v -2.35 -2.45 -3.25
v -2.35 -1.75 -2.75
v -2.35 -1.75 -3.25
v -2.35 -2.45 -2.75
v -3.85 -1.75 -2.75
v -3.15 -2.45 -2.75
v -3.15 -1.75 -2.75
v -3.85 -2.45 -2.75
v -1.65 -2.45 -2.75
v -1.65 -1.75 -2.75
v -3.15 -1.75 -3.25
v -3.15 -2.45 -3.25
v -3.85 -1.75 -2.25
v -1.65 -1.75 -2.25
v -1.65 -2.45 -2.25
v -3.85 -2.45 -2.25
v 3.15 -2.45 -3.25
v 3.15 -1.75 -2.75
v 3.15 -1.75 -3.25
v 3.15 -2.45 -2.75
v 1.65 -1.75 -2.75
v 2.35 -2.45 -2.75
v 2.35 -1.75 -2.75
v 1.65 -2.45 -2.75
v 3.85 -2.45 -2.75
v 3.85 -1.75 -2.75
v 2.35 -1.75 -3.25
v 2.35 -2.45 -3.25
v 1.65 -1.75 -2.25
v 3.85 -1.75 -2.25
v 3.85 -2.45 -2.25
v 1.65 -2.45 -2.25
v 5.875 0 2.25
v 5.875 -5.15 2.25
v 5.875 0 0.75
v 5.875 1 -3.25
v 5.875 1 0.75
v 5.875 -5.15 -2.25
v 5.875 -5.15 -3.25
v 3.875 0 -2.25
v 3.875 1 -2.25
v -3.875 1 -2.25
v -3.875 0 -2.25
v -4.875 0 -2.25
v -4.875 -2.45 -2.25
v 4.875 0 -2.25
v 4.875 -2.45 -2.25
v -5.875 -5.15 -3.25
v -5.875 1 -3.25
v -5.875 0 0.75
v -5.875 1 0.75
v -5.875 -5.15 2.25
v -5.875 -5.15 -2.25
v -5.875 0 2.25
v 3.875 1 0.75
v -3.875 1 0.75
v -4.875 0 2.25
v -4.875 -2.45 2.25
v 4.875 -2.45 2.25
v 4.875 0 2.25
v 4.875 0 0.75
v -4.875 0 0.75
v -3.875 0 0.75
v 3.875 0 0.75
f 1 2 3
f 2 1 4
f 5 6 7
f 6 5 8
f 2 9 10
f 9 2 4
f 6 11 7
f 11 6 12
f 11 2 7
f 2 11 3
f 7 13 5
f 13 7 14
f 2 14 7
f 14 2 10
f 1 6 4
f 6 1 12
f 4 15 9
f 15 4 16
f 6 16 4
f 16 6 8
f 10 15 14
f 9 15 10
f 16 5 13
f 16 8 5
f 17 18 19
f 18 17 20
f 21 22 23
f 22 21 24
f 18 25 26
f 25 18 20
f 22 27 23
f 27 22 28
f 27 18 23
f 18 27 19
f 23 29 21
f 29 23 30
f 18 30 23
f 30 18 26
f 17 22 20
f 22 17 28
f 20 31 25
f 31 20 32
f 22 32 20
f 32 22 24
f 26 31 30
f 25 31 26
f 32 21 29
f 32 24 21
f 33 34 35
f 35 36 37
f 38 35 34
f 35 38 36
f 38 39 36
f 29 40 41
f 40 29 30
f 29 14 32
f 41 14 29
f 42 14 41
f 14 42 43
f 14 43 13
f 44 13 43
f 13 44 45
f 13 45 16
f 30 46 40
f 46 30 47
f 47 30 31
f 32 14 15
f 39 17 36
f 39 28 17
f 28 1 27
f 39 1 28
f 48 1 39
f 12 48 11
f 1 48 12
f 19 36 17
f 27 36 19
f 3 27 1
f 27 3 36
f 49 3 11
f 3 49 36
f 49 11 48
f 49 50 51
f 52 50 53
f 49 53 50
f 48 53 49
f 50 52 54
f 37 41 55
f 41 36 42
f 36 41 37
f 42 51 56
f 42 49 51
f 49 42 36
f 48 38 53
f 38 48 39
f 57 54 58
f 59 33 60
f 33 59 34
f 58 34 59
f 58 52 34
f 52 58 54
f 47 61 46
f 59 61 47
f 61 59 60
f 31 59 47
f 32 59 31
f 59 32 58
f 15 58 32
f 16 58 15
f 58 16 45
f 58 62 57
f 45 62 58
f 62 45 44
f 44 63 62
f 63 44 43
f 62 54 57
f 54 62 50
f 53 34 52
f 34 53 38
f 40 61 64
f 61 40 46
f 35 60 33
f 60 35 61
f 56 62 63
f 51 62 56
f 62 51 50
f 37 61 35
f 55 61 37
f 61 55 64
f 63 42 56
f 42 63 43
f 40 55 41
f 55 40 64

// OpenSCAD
union () {
  linear_extrude (height=4.5, center=true){
    union () {
      translate ([4.875, -4.15, ]) {
        square ([1, 4.15]);
      }
      translate ([-4.875, -4.15, ]) {
        mirror ([1, 0, ]) {
          square ([1, 4.15]);
        }
      }
      translate ([0, -3.8000000000000003, ]) {
        square ([11.75, 2.7], center=true);
      }
    }
  }
  translate ([0, 0, -0.75]) {
    linear_extrude (height=3, center=true){
      union () {
        translate ([-5.875, 0, ]) {
          polygon (points=[[0, 0], [2, 0], [2, 1], [0, 1]]);
        }
        translate ([5.875, 0, ]) {
          mirror ([1, 0, ]) {
            polygon (points=[[0, 0], [2, 0], [2, 1], [0, 1]]);
          }
        }
      }
    }
  }
  difference () {
    translate ([0, -2.075, -2.75]) {
      cube ([11.75, 6.15, 1], center=true);
    }
    translate ([0, -2.45, 0]) {
      union () {
        translate ([-2.75, 0, -6.75]) {
          translate ([0, 0.35, 0]) {
            union () {
              translate ([0, 0, 2]) {
                cube ([0.8, 0.7, 4], center=true);
              }
              translate ([0, 0, 6.5]) {
                cube ([2.2, 0.7, 5], center=true);
              }
              translate ([0, 0, 9.5]) {
                cube ([1.7, 0.7, 1], center=true);
              }
            }
          }
        }
        translate ([2.75, 0, -6.75]) {
          translate ([0, 0.35, 0]) {
            union () {
              translate ([0, 0, 2]) {
                cube ([0.8, 0.7, 4], center=true);
              }
              translate ([0, 0, 6.5]) {
                cube ([2.2, 0.7, 5], center=true);
              }
              translate ([0, 0, 9.5]) {
                cube ([1.7, 0.7, 1], center=true);
              }
            }
          }
        }
      }
    }
  }
}
